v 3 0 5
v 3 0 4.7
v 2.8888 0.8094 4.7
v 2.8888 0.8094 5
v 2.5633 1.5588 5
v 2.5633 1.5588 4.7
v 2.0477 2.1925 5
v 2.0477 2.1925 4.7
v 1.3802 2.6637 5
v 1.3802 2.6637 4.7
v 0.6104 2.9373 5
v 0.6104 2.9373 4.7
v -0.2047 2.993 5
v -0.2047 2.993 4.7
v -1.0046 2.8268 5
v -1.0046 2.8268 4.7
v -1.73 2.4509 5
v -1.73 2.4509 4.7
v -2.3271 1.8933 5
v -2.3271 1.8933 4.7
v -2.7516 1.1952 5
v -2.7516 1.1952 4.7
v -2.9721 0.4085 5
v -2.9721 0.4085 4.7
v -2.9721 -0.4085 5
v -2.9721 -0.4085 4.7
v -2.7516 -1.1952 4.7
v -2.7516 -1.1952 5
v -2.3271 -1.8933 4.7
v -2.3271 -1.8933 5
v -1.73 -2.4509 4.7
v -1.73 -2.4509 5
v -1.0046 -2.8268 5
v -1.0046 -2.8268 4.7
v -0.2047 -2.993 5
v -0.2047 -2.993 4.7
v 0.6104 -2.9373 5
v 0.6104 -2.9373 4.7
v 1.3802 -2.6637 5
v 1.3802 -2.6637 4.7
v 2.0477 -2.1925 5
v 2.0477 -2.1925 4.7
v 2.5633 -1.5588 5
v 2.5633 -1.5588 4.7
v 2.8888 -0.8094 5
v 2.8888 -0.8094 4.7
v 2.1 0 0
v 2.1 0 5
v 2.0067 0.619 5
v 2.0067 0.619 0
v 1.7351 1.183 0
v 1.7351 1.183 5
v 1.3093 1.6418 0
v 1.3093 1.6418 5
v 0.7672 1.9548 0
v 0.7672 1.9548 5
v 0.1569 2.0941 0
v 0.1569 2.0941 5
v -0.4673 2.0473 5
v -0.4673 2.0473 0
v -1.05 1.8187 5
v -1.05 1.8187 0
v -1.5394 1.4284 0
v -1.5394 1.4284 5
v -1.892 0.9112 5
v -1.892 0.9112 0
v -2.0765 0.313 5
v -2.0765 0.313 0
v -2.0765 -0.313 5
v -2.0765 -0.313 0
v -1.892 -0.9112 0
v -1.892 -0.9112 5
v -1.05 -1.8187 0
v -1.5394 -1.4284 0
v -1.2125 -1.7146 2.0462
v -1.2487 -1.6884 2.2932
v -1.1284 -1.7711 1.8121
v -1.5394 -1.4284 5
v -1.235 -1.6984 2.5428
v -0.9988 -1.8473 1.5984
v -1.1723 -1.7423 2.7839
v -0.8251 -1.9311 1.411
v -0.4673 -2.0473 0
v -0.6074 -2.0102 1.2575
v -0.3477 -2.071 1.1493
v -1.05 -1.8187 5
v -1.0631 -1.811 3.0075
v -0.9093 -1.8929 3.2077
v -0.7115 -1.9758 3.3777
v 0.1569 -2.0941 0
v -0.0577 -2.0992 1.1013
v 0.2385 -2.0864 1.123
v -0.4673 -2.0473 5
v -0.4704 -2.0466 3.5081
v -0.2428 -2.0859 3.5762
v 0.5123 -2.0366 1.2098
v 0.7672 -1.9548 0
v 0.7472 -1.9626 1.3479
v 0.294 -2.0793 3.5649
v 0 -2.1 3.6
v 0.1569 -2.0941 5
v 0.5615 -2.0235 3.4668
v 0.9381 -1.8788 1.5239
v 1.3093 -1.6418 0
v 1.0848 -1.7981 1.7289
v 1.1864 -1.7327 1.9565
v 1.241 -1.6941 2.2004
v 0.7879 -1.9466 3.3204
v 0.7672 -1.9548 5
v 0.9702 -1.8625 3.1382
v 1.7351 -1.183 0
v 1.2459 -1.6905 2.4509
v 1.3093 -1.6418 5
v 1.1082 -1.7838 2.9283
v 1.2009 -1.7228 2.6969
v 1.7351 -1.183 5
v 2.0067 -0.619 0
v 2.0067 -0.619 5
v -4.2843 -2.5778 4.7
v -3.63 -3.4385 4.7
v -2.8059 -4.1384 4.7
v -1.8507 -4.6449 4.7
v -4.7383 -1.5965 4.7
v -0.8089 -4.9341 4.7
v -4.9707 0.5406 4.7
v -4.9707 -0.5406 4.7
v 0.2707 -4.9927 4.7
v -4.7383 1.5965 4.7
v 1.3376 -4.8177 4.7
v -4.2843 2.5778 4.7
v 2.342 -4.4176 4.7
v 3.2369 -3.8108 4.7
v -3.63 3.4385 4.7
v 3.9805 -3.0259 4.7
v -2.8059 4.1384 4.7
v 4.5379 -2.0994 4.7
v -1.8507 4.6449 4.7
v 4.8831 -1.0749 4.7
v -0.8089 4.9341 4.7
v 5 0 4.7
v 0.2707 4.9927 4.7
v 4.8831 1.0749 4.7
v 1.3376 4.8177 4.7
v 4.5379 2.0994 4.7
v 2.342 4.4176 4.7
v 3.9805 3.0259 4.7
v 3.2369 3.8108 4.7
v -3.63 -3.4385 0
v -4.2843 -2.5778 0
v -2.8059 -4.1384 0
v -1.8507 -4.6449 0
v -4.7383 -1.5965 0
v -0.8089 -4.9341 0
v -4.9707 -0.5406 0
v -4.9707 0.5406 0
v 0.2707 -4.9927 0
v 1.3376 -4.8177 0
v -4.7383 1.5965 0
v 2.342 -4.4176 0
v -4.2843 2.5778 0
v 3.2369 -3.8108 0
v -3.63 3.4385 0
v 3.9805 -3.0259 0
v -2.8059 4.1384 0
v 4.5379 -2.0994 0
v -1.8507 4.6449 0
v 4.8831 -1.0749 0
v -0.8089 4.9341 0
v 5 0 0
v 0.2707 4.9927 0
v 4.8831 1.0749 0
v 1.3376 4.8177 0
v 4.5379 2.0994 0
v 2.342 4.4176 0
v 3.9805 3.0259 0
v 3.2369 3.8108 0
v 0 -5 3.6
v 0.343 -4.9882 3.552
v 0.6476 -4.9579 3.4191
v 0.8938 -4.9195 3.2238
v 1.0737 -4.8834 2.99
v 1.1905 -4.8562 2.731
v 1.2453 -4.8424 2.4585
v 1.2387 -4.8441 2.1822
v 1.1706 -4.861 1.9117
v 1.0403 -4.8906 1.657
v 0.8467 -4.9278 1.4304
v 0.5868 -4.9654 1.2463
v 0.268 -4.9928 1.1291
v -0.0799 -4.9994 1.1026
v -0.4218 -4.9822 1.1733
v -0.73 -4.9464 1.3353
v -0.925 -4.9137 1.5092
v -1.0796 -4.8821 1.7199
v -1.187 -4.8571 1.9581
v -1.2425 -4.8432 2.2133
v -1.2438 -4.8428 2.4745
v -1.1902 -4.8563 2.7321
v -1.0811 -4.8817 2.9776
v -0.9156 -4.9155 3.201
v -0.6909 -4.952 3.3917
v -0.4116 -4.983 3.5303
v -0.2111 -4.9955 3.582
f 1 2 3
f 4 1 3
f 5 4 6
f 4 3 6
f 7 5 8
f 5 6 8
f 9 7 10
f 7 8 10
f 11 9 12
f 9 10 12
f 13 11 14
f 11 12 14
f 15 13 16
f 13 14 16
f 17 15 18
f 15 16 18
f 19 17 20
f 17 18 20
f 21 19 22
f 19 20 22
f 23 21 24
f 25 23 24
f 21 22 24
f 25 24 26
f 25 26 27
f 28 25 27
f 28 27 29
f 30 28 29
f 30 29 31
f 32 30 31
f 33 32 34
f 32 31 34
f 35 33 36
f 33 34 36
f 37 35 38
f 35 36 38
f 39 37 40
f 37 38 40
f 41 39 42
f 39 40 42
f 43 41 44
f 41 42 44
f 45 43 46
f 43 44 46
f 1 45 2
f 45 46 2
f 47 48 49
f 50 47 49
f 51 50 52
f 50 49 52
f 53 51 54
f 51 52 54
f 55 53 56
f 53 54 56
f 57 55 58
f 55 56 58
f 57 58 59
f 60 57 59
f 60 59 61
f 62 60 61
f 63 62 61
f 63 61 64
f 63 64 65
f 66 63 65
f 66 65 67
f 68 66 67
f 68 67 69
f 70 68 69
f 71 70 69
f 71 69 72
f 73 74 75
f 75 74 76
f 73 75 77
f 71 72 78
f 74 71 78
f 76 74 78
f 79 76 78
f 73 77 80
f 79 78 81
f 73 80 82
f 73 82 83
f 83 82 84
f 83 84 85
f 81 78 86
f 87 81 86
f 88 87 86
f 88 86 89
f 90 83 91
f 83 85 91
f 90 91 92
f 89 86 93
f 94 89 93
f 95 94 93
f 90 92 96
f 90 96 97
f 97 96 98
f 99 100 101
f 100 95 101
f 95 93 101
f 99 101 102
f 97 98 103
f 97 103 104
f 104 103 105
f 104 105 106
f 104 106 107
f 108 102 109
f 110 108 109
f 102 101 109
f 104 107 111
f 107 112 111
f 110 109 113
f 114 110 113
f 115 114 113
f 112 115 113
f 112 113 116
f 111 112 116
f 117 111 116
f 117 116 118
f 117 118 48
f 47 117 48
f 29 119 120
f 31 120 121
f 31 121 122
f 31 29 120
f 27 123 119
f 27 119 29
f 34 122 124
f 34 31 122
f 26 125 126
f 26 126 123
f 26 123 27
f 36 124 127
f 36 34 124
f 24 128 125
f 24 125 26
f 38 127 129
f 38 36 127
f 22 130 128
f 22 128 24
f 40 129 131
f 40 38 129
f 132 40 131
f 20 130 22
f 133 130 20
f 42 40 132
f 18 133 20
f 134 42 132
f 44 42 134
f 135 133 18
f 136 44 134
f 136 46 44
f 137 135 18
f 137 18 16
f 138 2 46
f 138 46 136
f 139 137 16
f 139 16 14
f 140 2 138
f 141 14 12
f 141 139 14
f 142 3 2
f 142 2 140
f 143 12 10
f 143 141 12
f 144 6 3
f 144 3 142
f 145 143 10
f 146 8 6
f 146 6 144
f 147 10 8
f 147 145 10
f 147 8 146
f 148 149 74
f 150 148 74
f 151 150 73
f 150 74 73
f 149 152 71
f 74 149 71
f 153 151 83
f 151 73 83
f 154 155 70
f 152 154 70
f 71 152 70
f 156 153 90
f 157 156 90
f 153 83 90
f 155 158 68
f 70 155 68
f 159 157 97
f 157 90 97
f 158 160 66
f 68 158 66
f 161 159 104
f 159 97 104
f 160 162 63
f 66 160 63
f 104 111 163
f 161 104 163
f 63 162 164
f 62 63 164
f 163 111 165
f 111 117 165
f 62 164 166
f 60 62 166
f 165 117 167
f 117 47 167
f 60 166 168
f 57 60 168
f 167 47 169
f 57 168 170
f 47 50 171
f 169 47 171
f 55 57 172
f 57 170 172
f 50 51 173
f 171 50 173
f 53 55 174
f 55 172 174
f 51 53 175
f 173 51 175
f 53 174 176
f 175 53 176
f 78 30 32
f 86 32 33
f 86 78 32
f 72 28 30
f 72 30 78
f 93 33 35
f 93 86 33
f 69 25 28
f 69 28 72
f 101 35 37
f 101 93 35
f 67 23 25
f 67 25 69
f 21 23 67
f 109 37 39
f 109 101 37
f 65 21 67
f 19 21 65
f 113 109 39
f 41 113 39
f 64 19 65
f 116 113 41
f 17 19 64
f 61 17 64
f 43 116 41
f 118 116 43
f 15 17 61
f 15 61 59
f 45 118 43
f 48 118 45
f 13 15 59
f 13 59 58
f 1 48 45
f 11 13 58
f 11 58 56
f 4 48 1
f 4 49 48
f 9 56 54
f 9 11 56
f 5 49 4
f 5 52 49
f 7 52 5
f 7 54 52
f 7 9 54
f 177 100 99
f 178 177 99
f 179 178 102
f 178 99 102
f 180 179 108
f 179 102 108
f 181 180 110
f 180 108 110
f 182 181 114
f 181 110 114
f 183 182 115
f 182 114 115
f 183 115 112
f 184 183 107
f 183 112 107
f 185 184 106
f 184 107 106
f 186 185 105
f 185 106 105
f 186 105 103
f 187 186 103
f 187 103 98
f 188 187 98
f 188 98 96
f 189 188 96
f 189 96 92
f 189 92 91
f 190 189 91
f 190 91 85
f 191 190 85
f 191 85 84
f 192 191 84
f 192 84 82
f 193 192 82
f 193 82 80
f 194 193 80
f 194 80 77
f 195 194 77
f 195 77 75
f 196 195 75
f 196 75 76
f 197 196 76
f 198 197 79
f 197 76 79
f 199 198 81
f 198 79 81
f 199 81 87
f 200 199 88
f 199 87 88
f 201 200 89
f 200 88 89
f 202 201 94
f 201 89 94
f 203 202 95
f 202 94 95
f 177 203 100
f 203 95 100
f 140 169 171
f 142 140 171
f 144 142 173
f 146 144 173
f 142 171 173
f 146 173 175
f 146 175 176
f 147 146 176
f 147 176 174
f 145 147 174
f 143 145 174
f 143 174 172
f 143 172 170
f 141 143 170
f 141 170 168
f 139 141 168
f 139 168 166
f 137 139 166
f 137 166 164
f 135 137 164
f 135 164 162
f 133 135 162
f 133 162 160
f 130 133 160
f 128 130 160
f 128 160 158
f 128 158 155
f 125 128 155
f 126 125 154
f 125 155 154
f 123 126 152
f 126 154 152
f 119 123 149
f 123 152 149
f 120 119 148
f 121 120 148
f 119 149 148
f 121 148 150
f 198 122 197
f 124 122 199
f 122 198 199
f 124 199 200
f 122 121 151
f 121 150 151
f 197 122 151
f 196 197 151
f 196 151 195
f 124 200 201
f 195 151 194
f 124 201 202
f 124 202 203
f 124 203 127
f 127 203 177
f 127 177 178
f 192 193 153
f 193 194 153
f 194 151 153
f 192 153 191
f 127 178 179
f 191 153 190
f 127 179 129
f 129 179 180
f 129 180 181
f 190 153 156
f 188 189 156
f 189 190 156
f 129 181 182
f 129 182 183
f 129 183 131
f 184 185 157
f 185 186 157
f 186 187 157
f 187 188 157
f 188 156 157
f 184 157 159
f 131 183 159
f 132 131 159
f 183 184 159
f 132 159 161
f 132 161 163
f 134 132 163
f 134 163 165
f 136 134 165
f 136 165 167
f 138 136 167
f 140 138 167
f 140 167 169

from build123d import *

# Parameters (mm, degrees)
ESQUISSE1_R             = 5
BOSS_EXTRU_1_DEPTH      = 4.7
ESQUISSE2_R             = 3
BOSS_EXTRU_3_DEPTH      = 0.3
ESQUISSE3_R             = 2.1
ENL_V_MAT_EXTRU_1_DEPTH = 9.660254038
ESQUISSE4_R             = 1.25
ENL_V_MAT_EXTRU_2_DEPTH = 9.660254038


with BuildPart() as part:
    # Esquisse1 → Boss.-Extru.1 (new body)
    with BuildSketch(Plane.XY):
        Circle(ESQUISSE1_R)
    extrude(amount=BOSS_EXTRU_1_DEPTH)

    # Esquisse2 → Boss.-Extru.3 (add)
    with BuildSketch(Plane.XY.offset(4.7)):
        Circle(ESQUISSE2_R)
    extrude(amount=BOSS_EXTRU_3_DEPTH)

    # Esquisse3 → Enlèv. mat.-Extru.1 (cut, through all)
    with BuildSketch(Plane.XY.offset(5)):
        Circle(ESQUISSE3_R)
    extrude(amount=-ENL_V_MAT_EXTRU_1_DEPTH, mode=Mode.SUBTRACT)

    # Esquisse4 → Enlèv. mat.-Extru.2 (cut, through all)
    with BuildSketch(Plane(origin=(0, 0, 0), x_dir=(1, 0, 0), z_dir=(0, 1, 0))):
        with Locations(Location((0, -2.35, 0), (0, 0, 270))):
            Circle(ESQUISSE4_R)
    extrude(amount=-ENL_V_MAT_EXTRU_2_DEPTH, mode=Mode.SUBTRACT)


solid = part.part
